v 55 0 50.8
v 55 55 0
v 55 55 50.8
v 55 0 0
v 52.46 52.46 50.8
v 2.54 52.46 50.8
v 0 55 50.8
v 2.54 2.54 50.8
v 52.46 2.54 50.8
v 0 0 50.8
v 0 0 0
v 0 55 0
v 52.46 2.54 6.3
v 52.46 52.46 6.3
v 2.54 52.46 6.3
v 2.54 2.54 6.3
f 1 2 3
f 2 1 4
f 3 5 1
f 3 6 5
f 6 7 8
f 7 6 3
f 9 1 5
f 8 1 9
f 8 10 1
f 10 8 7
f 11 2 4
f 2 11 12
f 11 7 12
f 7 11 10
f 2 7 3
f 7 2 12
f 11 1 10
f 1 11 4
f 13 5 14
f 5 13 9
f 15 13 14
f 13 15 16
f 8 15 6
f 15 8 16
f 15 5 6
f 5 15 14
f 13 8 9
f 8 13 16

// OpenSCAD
/* [Model Resolution (All dimensions are in Millimeters)] */
$fn = 256;

/* [Box Container Properties] */

Length = 55;
Width = 55;
Fit = 0; //.889(.035") is a good fit for most 
Height = 50.8;
Wall_Thickness = 2.54;
Floor_Thickness = 6.3;

/* [Screw Hole Properties] */
Screw_Holes_On = true;
Screw_Hole_Diameter = 5.08;
Amount_Of_Screw_Holes = 2;
Chamfer_Adjust = 3.5;

Outside_Box();

module Outside_Box(){
  difference()
{   
    // Outside Dimensions
    cube([ 
        Length, 
        Width, 
        Height ],
         center = false);
    // Inside Dimensions
    translate([ 
        Wall_Thickness, 
        Wall_Thickness, 
        Floor_Thickness])
        cube([ 
          Length-Wall_Thickness*2, 
          Width-Wall_Thickness*2, 
          Height], 
          center = false);
    
};
}
